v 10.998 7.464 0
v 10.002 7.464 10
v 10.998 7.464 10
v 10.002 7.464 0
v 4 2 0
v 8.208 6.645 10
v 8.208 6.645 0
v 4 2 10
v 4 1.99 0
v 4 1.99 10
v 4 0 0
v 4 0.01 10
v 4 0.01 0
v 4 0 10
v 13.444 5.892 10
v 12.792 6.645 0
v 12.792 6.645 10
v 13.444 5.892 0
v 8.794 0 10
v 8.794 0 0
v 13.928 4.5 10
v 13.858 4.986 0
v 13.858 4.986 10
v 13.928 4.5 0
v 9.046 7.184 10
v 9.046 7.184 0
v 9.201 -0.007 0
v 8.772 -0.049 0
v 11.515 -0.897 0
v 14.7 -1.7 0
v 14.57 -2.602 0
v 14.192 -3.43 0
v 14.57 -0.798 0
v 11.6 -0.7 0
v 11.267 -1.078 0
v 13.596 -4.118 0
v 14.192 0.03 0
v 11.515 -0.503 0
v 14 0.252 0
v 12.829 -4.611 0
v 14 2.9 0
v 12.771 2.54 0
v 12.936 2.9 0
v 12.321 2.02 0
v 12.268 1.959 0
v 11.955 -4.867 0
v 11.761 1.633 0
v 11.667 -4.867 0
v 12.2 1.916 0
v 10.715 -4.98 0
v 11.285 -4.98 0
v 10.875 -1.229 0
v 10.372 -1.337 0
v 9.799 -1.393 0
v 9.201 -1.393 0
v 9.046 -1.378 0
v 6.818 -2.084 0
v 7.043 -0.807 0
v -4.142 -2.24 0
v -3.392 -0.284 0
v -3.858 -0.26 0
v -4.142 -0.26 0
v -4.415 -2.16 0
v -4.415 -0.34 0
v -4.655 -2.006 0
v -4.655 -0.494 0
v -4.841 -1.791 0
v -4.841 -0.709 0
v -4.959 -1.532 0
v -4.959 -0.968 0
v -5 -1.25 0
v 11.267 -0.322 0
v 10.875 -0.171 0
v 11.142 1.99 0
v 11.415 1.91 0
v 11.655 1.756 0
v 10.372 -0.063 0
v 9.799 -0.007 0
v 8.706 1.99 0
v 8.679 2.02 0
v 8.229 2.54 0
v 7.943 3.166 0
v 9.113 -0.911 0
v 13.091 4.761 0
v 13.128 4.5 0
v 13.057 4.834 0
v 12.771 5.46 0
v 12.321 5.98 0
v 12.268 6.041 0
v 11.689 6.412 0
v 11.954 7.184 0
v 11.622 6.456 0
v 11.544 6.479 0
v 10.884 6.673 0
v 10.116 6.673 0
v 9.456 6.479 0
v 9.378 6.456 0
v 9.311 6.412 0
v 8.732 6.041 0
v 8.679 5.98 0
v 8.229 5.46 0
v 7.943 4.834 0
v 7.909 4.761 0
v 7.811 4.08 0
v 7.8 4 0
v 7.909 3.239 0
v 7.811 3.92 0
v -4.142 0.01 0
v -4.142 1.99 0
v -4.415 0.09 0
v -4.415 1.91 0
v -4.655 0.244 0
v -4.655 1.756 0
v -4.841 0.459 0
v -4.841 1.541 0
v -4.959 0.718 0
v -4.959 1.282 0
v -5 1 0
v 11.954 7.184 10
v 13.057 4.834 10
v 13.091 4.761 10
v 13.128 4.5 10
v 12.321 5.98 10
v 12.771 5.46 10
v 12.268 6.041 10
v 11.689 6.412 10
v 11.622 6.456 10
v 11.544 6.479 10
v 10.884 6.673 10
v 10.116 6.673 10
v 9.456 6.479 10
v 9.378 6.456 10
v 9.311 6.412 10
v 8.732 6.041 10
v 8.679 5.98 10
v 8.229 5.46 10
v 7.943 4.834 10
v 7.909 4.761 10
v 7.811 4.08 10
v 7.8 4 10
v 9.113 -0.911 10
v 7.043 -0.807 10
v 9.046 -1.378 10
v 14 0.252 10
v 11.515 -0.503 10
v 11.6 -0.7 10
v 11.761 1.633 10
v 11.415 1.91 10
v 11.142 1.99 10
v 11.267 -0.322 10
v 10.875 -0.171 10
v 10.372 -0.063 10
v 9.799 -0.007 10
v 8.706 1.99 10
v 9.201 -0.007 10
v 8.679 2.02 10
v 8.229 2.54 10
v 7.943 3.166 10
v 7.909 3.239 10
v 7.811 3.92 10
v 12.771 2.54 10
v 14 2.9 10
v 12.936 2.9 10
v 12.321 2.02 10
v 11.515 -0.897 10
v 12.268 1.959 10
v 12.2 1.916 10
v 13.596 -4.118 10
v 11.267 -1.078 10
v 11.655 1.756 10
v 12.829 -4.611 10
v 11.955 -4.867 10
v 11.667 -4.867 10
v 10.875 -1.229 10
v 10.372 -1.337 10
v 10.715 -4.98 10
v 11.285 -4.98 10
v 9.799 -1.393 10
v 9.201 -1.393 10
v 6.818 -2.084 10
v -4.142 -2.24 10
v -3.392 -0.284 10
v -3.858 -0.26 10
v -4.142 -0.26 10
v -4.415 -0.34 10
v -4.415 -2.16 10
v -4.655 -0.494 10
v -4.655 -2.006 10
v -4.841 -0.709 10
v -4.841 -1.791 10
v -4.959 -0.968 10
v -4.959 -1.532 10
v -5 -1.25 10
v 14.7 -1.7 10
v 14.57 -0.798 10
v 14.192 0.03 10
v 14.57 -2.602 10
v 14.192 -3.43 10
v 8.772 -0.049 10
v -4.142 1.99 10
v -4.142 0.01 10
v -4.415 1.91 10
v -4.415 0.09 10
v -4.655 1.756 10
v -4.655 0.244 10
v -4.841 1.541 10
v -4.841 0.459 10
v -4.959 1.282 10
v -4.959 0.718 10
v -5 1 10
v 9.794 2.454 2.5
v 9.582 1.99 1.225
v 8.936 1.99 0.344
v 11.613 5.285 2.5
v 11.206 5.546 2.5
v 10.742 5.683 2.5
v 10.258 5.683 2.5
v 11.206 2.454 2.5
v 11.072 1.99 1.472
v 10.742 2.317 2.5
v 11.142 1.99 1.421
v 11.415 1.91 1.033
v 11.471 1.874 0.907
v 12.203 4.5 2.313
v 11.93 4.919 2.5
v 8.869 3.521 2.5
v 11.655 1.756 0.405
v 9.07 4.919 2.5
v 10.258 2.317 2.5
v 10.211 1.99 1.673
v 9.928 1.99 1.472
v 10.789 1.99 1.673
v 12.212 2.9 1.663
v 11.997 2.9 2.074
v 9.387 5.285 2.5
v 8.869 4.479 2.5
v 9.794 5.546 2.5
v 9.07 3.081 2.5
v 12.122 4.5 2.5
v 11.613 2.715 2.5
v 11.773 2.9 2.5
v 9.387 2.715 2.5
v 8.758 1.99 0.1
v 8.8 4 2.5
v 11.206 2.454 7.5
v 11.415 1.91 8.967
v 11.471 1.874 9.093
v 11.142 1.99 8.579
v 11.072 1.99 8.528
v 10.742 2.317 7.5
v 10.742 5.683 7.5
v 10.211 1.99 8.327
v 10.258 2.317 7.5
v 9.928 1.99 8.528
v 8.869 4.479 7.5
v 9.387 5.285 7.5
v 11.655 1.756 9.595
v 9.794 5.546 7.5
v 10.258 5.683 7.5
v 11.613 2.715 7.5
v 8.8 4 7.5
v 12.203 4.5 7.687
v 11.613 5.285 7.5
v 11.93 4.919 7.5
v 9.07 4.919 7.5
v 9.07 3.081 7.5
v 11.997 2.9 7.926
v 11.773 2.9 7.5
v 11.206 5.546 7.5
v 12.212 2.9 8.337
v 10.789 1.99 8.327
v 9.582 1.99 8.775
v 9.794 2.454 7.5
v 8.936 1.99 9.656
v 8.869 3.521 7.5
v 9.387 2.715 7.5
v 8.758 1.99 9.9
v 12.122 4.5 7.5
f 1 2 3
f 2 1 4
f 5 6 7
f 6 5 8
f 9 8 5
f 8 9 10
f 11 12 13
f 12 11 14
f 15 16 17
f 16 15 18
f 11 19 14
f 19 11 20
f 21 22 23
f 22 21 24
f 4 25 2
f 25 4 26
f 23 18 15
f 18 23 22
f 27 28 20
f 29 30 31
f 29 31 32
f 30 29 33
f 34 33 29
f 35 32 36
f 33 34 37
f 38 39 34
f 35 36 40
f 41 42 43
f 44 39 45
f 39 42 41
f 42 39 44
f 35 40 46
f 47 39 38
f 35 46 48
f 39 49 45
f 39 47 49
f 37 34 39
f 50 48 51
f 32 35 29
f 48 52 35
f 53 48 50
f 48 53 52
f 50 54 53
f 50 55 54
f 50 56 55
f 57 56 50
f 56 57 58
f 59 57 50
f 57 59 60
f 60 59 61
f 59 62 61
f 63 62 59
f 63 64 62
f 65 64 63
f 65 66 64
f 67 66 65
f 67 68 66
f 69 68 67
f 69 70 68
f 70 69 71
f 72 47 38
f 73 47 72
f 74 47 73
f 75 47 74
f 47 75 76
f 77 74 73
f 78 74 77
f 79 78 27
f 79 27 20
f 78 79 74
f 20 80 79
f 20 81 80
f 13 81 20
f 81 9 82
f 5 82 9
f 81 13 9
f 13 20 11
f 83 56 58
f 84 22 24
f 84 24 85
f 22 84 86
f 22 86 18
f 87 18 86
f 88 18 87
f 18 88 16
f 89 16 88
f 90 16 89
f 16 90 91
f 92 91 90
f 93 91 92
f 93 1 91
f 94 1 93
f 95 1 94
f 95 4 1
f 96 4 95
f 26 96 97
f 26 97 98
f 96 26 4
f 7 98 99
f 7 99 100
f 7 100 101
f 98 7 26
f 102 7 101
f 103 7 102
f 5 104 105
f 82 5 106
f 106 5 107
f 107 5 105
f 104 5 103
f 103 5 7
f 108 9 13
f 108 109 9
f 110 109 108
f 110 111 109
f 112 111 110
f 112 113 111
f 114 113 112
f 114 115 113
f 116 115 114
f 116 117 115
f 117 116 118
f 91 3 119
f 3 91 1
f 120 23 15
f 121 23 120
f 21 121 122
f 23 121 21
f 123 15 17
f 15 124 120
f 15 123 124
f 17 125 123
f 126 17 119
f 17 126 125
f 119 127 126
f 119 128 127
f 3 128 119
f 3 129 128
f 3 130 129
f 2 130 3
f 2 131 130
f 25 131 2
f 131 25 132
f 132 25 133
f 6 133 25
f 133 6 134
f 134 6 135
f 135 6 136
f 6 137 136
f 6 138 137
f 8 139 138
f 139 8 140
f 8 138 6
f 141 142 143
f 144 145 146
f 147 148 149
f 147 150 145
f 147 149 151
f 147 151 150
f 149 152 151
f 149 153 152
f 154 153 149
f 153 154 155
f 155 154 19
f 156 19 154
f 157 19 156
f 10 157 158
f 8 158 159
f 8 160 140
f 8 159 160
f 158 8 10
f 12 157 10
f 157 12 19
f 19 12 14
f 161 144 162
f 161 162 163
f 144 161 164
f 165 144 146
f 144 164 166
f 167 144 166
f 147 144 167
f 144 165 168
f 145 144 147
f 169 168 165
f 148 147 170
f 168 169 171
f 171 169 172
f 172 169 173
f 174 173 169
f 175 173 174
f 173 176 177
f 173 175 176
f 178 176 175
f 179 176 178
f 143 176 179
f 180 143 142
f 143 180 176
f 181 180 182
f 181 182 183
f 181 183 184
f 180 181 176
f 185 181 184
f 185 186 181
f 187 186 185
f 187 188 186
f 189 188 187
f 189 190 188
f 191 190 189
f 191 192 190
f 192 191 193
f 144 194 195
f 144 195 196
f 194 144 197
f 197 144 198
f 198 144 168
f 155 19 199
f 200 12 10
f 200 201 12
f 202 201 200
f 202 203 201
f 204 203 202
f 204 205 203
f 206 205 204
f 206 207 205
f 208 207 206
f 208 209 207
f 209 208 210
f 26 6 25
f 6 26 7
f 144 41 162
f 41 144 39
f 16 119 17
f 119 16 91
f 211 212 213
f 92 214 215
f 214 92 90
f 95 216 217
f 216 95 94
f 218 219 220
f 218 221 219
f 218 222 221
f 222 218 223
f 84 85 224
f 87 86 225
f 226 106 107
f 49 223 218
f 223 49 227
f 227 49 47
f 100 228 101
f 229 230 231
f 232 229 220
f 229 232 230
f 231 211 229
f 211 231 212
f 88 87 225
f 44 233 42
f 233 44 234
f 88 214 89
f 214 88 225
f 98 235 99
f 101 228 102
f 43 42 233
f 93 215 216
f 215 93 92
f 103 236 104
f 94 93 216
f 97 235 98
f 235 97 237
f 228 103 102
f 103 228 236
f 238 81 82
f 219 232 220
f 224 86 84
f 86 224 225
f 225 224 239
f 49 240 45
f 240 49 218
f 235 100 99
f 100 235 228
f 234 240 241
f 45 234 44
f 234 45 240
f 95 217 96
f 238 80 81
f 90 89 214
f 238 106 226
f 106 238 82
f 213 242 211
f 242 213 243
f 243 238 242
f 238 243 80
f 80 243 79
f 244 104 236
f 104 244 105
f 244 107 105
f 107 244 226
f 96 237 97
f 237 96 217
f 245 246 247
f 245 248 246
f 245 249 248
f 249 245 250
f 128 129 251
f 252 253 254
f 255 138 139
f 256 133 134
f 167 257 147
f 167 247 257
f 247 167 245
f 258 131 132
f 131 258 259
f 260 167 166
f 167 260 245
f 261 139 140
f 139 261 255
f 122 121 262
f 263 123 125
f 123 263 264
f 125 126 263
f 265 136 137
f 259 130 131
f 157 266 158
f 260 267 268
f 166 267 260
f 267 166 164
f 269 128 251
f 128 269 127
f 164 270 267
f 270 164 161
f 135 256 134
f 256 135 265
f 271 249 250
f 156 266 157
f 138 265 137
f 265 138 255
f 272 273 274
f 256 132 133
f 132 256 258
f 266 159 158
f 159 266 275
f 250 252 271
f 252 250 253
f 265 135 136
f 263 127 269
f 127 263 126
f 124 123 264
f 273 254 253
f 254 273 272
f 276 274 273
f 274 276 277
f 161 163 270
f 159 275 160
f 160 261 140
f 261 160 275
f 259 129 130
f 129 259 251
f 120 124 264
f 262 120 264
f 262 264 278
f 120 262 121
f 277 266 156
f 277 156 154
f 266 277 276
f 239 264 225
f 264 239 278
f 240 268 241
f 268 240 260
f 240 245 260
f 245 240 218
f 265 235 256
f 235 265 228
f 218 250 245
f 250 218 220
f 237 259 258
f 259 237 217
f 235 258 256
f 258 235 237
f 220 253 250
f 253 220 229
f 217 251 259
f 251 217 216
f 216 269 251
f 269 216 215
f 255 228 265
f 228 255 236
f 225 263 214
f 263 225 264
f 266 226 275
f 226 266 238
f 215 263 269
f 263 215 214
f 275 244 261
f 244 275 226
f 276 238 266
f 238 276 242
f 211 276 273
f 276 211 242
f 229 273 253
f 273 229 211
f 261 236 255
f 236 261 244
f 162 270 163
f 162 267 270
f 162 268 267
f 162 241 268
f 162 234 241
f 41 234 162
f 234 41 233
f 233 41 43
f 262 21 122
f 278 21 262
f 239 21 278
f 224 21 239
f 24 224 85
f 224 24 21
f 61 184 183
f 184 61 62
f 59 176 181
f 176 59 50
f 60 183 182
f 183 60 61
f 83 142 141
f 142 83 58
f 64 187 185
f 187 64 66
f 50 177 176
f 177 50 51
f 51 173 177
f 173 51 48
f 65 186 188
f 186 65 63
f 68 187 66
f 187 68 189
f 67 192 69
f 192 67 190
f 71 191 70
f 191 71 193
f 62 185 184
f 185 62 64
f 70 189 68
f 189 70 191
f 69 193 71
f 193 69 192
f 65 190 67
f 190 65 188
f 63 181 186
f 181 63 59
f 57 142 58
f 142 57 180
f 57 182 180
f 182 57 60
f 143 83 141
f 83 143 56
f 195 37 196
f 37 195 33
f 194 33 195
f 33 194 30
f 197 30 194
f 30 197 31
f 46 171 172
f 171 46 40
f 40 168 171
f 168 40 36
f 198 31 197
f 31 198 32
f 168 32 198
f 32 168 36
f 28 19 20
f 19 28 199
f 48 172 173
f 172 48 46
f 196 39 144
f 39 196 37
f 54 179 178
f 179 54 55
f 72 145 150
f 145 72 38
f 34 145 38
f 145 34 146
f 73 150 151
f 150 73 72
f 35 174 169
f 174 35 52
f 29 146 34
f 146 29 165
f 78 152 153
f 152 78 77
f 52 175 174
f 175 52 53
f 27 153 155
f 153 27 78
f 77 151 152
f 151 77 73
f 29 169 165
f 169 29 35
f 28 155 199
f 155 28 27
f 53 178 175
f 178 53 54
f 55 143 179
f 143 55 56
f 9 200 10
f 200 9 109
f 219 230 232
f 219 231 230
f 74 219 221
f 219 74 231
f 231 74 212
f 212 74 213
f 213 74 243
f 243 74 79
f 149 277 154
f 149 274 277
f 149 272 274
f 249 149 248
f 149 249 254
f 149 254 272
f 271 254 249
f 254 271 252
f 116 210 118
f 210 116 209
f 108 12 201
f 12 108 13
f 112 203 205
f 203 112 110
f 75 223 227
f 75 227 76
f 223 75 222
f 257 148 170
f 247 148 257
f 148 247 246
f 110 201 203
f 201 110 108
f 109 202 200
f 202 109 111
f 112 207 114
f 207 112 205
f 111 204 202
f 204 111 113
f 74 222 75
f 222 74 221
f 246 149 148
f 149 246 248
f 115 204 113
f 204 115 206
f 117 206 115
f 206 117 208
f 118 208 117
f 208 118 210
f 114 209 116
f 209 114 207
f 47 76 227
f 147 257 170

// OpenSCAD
// Under1
// Fiber holder for back wheel wells


//-------------------------------------


//--------------------------------------------
module block2(
    r0=3.5,   // radius for boss
    s1=6,   // length of side
    r1=1.0,   // radius for fillets
    z1=10,  // height of block
    r2=1.7,  // radius for fiber cut
    t1=10,   // tongue length
    s2=3,   // slot width
){
    
    translate([7,1.5,0])
    difference(){
        // boss
        hull(){
            translate([r0,2.5,0])
            cylinder(r=r0,h=z1,$fn=22);       
            
            translate([-3,-1.5,0])
            cube([10,2,z1]);       
        }
        
        // fiber hole
        color("blue")
        translate([r0,2.5,-0.5])
        cylinder(r1=r2+1.2, r2=r2,h=z1/4+0.5,$fn=22);
        color("cyan")
        translate([r0,2.5,0.75*z1])
        cylinder(r1=r2, r2=r2+1.2,h=z1/4+0.5,$fn=22);
        color("orange")
        translate([r0,2.5,0])
        cylinder(r=r2,h=z1,$fn=22);
        
        // stress relief
        color("pink")
        translate([0.42*s1,3,-0.5])
        rotate([0,0,-90])
        cube([1.6,10,z1+1]);
        
    }
    
    // tongue led side
    hull(){
        translate([-t1,r1,0])
        color("cyan")
        translate([s1,0,0])
        cylinder(r=r1,h=z1,$fn=22);
        
        translate([5,r1,0])
        color("cyan")
        translate([s1,0,0])
        cylinder(r=r1,h=z1,$fn=22);        
    }

    // tongue wheel side
    translate([0,-s2,0])
    difference(){
    hull(){
        translate([-t1,r1+0.75,0])
        color("cyan")
        translate([s1,0,0])
        cylinder(r=r1,h=z1,$fn=22);
        
        translate([5,r1,0])
        color("cyan")
        translate([s1,-1,0])
        cylinder(r=2*r1,h=z1,$fn=22);        
    }
        translate([-t1+5,3.0,0])
        rotate([0,0,-10])
        cube([12,2,2*z1]);

        color("green")
        translate([12,-1.7+s2,0])
        cylinder(r=3,h=z1,$fn=22);
    }

    // connecting tip
    difference(){
        color("green")
        translate([11.5,-1.7,0])
        cylinder(r=3.2,h=z1,$fn=22);
           
        color("pink")
        translate([9.5,-0.7,-0.5])
        scale([3,1,1])
        cylinder(r=0.7,h=z1+1,$fn=22);
    }
}






//==============================================

block2();

//=================================================
